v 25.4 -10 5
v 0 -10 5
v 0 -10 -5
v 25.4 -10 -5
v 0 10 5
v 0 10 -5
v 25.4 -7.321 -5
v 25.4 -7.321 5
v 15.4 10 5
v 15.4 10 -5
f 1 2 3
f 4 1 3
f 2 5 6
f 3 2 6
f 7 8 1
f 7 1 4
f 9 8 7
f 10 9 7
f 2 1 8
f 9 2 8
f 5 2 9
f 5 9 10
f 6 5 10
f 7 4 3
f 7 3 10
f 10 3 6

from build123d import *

# Parameters (mm, degrees)
SKETCH1_W           = 10
SKETCH1_H           = 20
BOSS_EXTRUDE1_DEPTH = 25.4
CHAMFER1_SIZE       = 10
CHAMFER1_SIZE2      = 17.320508076


with BuildPart() as part:
    # Sketch1 → Boss-Extrude1 (new body)
    with BuildSketch(Plane(origin=(0, 0, 0), x_dir=(0, 0, -1), z_dir=(1, 0, 0))):
        Rectangle(SKETCH1_W, SKETCH1_H)
    extrude(amount=BOSS_EXTRUDE1_DEPTH)

    # Chamfer1
    chamfer1_edges = [part.edges().sort_by_distance(p)[0] for p in [
        (25.4, 10, 0),
    ]]
    chamfer1_side = [part.faces().sort_by_distance(p)[0] for p in [
        (12.7, 10, 0),
    ]]
    chamfer(chamfer1_edges, length=CHAMFER1_SIZE, length2=CHAMFER1_SIZE2, reference=chamfer1_side[0])


solid = part.part
